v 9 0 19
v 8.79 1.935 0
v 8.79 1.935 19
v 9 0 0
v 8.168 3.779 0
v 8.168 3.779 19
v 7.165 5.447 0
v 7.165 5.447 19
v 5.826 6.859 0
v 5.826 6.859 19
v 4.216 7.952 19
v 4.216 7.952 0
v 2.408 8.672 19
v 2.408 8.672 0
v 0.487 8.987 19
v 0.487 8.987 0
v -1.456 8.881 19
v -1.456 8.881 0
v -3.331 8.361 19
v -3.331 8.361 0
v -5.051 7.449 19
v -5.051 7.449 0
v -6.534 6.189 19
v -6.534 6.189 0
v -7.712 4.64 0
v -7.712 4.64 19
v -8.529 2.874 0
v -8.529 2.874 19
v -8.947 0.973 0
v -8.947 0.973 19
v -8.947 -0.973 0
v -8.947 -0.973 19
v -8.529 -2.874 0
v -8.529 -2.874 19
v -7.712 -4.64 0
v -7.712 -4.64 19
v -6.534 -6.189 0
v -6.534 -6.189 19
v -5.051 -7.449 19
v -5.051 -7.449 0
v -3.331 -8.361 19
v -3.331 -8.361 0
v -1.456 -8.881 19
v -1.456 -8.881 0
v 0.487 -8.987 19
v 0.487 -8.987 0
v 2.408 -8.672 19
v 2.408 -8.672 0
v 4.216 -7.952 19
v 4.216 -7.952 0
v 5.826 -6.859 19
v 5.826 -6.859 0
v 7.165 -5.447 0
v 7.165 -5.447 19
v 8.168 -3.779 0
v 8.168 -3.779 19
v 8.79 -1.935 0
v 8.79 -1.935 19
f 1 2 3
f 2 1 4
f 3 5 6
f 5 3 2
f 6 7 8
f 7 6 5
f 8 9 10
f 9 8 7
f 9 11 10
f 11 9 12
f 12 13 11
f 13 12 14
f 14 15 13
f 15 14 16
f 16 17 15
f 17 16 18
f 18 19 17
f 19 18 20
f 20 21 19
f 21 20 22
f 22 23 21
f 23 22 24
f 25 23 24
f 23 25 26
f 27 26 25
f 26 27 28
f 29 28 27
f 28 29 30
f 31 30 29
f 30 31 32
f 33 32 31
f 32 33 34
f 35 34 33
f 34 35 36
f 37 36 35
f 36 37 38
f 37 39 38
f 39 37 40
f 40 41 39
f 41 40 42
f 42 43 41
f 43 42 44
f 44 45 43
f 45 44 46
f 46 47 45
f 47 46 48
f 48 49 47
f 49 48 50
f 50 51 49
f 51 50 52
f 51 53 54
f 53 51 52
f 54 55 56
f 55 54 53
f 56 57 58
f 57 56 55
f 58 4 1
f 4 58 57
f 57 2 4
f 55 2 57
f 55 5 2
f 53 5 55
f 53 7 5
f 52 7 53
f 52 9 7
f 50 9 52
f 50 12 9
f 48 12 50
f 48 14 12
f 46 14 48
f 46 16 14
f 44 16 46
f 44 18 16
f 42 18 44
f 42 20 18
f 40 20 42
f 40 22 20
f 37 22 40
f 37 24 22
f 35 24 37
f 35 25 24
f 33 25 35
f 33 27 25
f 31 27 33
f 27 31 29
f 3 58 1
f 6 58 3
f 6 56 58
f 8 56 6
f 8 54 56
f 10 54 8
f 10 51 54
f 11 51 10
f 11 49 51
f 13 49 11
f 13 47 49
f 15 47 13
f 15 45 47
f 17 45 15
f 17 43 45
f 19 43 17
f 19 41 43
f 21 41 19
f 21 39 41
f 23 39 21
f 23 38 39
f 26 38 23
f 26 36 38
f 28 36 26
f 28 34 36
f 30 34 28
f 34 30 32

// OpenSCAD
// Generated by SolidPython 1.0.1 on 2020-07-29 00:46:45


cylinder(h = 19, r1 = 9, r2 = 9);
/***********************************************
*********      SolidPython code:      **********
************************************************
 
# import packages: SolidPython
from solid import *
from solid.utils import *
from itertools import chain, combinations, permutations


class Resize:

    def __init__(self, scad_file):
        self.scad_file = scad_file
        #self.scad_file = import_scad(scad_file)
        # cone/cylinder param:
        self.r1 = 0
        self.r2 = 0
        self.h = 0
        # rectangular prism param:
        self.w = 0
        self.l = 0
        # ellipse param:
        self.r = 0

    # import OpenScad code (file name corresponds to shape)


    # classify shape + parameters
    def assign(self, param1, param2, param3):
        if self.scad_file == 'cone.scad':
            self.r1 = param1
            self.r2 = param2
            self.h = param3
        elif self.scad_file == 'cylinder.scad':
            self.r1 = param1
            self.r2 = param2
            self.h = param3
        elif self.scad_file == 'rectangularPrism.scad':
            self.h = param1
            self.l = param2
            self.w = param3
        else:
            self.r = param1
            self.h = param2

    # resize parameters
    def iterate(self):
        x = range(3, 20, 2)
        i = 1
        if self.scad_file == 'cone.scad':
            tempList = list(permutations(x, 2))
            for temp in tempList:
                param1 = temp[0]
                param2 = temp[1]
                filepath = 'produced_scad_files/' + 'cone' + str(param1) + '_' + str(param2) + '_' + '.scad'
                scad_render_to_file(cylinder(h=param1, r1=param2, r2=0), filepath)

        elif self.scad_file == 'cylinder.scad':
            tempList = list(permutations(x, 3))
            for temp in tempList:
                param1 = temp[0]
                param2 = temp[1]
                filepath = 'produced_scad_files/' + 'cylinder' + str(param1) + '_' + str(param2) + '_' + '.scad'
                scad_render_to_file(cylinder(h=param1, r1=param2, r2=param2), filepath)

        elif self.scad_file == 'rectangularPrism.scad':
            tempList = list(permutations(x, 3))
            for temp in tempList:
                param1 = temp[0]
                param2 = temp[1]
                param3 = temp[2]
                filepath = 'produced_scad_files/' + 'rectangularPrism' + str(param1) + '_' + str(param2) + '_' + str(
                    param3) + '.scad'
                scad_render_to_file(cube(size=(param1, param2, param3)), filepath)

        elif self.scad_file == 'ellipse.scad':
            tempList = list(permutations(x, 4))
            for temp in tempList:
                param1 = temp[0]
                param2 = temp[1]
                param3 = temp[2]
                param4 = temp[3]
                filepath = 'produced_scad_files/' + 'ellipse' + str(param1) + '_' + str(param2) + '_' + str(param3) + '_' + str(param4) + '.scad'
                scad_render_to_file(scale([param1, param2, param3])(sphere(r=param4)), filepath)

    def render_to_scadfile(self):
        scad_render_to_file(scad, 'example.scad') 
 
************************************************/
